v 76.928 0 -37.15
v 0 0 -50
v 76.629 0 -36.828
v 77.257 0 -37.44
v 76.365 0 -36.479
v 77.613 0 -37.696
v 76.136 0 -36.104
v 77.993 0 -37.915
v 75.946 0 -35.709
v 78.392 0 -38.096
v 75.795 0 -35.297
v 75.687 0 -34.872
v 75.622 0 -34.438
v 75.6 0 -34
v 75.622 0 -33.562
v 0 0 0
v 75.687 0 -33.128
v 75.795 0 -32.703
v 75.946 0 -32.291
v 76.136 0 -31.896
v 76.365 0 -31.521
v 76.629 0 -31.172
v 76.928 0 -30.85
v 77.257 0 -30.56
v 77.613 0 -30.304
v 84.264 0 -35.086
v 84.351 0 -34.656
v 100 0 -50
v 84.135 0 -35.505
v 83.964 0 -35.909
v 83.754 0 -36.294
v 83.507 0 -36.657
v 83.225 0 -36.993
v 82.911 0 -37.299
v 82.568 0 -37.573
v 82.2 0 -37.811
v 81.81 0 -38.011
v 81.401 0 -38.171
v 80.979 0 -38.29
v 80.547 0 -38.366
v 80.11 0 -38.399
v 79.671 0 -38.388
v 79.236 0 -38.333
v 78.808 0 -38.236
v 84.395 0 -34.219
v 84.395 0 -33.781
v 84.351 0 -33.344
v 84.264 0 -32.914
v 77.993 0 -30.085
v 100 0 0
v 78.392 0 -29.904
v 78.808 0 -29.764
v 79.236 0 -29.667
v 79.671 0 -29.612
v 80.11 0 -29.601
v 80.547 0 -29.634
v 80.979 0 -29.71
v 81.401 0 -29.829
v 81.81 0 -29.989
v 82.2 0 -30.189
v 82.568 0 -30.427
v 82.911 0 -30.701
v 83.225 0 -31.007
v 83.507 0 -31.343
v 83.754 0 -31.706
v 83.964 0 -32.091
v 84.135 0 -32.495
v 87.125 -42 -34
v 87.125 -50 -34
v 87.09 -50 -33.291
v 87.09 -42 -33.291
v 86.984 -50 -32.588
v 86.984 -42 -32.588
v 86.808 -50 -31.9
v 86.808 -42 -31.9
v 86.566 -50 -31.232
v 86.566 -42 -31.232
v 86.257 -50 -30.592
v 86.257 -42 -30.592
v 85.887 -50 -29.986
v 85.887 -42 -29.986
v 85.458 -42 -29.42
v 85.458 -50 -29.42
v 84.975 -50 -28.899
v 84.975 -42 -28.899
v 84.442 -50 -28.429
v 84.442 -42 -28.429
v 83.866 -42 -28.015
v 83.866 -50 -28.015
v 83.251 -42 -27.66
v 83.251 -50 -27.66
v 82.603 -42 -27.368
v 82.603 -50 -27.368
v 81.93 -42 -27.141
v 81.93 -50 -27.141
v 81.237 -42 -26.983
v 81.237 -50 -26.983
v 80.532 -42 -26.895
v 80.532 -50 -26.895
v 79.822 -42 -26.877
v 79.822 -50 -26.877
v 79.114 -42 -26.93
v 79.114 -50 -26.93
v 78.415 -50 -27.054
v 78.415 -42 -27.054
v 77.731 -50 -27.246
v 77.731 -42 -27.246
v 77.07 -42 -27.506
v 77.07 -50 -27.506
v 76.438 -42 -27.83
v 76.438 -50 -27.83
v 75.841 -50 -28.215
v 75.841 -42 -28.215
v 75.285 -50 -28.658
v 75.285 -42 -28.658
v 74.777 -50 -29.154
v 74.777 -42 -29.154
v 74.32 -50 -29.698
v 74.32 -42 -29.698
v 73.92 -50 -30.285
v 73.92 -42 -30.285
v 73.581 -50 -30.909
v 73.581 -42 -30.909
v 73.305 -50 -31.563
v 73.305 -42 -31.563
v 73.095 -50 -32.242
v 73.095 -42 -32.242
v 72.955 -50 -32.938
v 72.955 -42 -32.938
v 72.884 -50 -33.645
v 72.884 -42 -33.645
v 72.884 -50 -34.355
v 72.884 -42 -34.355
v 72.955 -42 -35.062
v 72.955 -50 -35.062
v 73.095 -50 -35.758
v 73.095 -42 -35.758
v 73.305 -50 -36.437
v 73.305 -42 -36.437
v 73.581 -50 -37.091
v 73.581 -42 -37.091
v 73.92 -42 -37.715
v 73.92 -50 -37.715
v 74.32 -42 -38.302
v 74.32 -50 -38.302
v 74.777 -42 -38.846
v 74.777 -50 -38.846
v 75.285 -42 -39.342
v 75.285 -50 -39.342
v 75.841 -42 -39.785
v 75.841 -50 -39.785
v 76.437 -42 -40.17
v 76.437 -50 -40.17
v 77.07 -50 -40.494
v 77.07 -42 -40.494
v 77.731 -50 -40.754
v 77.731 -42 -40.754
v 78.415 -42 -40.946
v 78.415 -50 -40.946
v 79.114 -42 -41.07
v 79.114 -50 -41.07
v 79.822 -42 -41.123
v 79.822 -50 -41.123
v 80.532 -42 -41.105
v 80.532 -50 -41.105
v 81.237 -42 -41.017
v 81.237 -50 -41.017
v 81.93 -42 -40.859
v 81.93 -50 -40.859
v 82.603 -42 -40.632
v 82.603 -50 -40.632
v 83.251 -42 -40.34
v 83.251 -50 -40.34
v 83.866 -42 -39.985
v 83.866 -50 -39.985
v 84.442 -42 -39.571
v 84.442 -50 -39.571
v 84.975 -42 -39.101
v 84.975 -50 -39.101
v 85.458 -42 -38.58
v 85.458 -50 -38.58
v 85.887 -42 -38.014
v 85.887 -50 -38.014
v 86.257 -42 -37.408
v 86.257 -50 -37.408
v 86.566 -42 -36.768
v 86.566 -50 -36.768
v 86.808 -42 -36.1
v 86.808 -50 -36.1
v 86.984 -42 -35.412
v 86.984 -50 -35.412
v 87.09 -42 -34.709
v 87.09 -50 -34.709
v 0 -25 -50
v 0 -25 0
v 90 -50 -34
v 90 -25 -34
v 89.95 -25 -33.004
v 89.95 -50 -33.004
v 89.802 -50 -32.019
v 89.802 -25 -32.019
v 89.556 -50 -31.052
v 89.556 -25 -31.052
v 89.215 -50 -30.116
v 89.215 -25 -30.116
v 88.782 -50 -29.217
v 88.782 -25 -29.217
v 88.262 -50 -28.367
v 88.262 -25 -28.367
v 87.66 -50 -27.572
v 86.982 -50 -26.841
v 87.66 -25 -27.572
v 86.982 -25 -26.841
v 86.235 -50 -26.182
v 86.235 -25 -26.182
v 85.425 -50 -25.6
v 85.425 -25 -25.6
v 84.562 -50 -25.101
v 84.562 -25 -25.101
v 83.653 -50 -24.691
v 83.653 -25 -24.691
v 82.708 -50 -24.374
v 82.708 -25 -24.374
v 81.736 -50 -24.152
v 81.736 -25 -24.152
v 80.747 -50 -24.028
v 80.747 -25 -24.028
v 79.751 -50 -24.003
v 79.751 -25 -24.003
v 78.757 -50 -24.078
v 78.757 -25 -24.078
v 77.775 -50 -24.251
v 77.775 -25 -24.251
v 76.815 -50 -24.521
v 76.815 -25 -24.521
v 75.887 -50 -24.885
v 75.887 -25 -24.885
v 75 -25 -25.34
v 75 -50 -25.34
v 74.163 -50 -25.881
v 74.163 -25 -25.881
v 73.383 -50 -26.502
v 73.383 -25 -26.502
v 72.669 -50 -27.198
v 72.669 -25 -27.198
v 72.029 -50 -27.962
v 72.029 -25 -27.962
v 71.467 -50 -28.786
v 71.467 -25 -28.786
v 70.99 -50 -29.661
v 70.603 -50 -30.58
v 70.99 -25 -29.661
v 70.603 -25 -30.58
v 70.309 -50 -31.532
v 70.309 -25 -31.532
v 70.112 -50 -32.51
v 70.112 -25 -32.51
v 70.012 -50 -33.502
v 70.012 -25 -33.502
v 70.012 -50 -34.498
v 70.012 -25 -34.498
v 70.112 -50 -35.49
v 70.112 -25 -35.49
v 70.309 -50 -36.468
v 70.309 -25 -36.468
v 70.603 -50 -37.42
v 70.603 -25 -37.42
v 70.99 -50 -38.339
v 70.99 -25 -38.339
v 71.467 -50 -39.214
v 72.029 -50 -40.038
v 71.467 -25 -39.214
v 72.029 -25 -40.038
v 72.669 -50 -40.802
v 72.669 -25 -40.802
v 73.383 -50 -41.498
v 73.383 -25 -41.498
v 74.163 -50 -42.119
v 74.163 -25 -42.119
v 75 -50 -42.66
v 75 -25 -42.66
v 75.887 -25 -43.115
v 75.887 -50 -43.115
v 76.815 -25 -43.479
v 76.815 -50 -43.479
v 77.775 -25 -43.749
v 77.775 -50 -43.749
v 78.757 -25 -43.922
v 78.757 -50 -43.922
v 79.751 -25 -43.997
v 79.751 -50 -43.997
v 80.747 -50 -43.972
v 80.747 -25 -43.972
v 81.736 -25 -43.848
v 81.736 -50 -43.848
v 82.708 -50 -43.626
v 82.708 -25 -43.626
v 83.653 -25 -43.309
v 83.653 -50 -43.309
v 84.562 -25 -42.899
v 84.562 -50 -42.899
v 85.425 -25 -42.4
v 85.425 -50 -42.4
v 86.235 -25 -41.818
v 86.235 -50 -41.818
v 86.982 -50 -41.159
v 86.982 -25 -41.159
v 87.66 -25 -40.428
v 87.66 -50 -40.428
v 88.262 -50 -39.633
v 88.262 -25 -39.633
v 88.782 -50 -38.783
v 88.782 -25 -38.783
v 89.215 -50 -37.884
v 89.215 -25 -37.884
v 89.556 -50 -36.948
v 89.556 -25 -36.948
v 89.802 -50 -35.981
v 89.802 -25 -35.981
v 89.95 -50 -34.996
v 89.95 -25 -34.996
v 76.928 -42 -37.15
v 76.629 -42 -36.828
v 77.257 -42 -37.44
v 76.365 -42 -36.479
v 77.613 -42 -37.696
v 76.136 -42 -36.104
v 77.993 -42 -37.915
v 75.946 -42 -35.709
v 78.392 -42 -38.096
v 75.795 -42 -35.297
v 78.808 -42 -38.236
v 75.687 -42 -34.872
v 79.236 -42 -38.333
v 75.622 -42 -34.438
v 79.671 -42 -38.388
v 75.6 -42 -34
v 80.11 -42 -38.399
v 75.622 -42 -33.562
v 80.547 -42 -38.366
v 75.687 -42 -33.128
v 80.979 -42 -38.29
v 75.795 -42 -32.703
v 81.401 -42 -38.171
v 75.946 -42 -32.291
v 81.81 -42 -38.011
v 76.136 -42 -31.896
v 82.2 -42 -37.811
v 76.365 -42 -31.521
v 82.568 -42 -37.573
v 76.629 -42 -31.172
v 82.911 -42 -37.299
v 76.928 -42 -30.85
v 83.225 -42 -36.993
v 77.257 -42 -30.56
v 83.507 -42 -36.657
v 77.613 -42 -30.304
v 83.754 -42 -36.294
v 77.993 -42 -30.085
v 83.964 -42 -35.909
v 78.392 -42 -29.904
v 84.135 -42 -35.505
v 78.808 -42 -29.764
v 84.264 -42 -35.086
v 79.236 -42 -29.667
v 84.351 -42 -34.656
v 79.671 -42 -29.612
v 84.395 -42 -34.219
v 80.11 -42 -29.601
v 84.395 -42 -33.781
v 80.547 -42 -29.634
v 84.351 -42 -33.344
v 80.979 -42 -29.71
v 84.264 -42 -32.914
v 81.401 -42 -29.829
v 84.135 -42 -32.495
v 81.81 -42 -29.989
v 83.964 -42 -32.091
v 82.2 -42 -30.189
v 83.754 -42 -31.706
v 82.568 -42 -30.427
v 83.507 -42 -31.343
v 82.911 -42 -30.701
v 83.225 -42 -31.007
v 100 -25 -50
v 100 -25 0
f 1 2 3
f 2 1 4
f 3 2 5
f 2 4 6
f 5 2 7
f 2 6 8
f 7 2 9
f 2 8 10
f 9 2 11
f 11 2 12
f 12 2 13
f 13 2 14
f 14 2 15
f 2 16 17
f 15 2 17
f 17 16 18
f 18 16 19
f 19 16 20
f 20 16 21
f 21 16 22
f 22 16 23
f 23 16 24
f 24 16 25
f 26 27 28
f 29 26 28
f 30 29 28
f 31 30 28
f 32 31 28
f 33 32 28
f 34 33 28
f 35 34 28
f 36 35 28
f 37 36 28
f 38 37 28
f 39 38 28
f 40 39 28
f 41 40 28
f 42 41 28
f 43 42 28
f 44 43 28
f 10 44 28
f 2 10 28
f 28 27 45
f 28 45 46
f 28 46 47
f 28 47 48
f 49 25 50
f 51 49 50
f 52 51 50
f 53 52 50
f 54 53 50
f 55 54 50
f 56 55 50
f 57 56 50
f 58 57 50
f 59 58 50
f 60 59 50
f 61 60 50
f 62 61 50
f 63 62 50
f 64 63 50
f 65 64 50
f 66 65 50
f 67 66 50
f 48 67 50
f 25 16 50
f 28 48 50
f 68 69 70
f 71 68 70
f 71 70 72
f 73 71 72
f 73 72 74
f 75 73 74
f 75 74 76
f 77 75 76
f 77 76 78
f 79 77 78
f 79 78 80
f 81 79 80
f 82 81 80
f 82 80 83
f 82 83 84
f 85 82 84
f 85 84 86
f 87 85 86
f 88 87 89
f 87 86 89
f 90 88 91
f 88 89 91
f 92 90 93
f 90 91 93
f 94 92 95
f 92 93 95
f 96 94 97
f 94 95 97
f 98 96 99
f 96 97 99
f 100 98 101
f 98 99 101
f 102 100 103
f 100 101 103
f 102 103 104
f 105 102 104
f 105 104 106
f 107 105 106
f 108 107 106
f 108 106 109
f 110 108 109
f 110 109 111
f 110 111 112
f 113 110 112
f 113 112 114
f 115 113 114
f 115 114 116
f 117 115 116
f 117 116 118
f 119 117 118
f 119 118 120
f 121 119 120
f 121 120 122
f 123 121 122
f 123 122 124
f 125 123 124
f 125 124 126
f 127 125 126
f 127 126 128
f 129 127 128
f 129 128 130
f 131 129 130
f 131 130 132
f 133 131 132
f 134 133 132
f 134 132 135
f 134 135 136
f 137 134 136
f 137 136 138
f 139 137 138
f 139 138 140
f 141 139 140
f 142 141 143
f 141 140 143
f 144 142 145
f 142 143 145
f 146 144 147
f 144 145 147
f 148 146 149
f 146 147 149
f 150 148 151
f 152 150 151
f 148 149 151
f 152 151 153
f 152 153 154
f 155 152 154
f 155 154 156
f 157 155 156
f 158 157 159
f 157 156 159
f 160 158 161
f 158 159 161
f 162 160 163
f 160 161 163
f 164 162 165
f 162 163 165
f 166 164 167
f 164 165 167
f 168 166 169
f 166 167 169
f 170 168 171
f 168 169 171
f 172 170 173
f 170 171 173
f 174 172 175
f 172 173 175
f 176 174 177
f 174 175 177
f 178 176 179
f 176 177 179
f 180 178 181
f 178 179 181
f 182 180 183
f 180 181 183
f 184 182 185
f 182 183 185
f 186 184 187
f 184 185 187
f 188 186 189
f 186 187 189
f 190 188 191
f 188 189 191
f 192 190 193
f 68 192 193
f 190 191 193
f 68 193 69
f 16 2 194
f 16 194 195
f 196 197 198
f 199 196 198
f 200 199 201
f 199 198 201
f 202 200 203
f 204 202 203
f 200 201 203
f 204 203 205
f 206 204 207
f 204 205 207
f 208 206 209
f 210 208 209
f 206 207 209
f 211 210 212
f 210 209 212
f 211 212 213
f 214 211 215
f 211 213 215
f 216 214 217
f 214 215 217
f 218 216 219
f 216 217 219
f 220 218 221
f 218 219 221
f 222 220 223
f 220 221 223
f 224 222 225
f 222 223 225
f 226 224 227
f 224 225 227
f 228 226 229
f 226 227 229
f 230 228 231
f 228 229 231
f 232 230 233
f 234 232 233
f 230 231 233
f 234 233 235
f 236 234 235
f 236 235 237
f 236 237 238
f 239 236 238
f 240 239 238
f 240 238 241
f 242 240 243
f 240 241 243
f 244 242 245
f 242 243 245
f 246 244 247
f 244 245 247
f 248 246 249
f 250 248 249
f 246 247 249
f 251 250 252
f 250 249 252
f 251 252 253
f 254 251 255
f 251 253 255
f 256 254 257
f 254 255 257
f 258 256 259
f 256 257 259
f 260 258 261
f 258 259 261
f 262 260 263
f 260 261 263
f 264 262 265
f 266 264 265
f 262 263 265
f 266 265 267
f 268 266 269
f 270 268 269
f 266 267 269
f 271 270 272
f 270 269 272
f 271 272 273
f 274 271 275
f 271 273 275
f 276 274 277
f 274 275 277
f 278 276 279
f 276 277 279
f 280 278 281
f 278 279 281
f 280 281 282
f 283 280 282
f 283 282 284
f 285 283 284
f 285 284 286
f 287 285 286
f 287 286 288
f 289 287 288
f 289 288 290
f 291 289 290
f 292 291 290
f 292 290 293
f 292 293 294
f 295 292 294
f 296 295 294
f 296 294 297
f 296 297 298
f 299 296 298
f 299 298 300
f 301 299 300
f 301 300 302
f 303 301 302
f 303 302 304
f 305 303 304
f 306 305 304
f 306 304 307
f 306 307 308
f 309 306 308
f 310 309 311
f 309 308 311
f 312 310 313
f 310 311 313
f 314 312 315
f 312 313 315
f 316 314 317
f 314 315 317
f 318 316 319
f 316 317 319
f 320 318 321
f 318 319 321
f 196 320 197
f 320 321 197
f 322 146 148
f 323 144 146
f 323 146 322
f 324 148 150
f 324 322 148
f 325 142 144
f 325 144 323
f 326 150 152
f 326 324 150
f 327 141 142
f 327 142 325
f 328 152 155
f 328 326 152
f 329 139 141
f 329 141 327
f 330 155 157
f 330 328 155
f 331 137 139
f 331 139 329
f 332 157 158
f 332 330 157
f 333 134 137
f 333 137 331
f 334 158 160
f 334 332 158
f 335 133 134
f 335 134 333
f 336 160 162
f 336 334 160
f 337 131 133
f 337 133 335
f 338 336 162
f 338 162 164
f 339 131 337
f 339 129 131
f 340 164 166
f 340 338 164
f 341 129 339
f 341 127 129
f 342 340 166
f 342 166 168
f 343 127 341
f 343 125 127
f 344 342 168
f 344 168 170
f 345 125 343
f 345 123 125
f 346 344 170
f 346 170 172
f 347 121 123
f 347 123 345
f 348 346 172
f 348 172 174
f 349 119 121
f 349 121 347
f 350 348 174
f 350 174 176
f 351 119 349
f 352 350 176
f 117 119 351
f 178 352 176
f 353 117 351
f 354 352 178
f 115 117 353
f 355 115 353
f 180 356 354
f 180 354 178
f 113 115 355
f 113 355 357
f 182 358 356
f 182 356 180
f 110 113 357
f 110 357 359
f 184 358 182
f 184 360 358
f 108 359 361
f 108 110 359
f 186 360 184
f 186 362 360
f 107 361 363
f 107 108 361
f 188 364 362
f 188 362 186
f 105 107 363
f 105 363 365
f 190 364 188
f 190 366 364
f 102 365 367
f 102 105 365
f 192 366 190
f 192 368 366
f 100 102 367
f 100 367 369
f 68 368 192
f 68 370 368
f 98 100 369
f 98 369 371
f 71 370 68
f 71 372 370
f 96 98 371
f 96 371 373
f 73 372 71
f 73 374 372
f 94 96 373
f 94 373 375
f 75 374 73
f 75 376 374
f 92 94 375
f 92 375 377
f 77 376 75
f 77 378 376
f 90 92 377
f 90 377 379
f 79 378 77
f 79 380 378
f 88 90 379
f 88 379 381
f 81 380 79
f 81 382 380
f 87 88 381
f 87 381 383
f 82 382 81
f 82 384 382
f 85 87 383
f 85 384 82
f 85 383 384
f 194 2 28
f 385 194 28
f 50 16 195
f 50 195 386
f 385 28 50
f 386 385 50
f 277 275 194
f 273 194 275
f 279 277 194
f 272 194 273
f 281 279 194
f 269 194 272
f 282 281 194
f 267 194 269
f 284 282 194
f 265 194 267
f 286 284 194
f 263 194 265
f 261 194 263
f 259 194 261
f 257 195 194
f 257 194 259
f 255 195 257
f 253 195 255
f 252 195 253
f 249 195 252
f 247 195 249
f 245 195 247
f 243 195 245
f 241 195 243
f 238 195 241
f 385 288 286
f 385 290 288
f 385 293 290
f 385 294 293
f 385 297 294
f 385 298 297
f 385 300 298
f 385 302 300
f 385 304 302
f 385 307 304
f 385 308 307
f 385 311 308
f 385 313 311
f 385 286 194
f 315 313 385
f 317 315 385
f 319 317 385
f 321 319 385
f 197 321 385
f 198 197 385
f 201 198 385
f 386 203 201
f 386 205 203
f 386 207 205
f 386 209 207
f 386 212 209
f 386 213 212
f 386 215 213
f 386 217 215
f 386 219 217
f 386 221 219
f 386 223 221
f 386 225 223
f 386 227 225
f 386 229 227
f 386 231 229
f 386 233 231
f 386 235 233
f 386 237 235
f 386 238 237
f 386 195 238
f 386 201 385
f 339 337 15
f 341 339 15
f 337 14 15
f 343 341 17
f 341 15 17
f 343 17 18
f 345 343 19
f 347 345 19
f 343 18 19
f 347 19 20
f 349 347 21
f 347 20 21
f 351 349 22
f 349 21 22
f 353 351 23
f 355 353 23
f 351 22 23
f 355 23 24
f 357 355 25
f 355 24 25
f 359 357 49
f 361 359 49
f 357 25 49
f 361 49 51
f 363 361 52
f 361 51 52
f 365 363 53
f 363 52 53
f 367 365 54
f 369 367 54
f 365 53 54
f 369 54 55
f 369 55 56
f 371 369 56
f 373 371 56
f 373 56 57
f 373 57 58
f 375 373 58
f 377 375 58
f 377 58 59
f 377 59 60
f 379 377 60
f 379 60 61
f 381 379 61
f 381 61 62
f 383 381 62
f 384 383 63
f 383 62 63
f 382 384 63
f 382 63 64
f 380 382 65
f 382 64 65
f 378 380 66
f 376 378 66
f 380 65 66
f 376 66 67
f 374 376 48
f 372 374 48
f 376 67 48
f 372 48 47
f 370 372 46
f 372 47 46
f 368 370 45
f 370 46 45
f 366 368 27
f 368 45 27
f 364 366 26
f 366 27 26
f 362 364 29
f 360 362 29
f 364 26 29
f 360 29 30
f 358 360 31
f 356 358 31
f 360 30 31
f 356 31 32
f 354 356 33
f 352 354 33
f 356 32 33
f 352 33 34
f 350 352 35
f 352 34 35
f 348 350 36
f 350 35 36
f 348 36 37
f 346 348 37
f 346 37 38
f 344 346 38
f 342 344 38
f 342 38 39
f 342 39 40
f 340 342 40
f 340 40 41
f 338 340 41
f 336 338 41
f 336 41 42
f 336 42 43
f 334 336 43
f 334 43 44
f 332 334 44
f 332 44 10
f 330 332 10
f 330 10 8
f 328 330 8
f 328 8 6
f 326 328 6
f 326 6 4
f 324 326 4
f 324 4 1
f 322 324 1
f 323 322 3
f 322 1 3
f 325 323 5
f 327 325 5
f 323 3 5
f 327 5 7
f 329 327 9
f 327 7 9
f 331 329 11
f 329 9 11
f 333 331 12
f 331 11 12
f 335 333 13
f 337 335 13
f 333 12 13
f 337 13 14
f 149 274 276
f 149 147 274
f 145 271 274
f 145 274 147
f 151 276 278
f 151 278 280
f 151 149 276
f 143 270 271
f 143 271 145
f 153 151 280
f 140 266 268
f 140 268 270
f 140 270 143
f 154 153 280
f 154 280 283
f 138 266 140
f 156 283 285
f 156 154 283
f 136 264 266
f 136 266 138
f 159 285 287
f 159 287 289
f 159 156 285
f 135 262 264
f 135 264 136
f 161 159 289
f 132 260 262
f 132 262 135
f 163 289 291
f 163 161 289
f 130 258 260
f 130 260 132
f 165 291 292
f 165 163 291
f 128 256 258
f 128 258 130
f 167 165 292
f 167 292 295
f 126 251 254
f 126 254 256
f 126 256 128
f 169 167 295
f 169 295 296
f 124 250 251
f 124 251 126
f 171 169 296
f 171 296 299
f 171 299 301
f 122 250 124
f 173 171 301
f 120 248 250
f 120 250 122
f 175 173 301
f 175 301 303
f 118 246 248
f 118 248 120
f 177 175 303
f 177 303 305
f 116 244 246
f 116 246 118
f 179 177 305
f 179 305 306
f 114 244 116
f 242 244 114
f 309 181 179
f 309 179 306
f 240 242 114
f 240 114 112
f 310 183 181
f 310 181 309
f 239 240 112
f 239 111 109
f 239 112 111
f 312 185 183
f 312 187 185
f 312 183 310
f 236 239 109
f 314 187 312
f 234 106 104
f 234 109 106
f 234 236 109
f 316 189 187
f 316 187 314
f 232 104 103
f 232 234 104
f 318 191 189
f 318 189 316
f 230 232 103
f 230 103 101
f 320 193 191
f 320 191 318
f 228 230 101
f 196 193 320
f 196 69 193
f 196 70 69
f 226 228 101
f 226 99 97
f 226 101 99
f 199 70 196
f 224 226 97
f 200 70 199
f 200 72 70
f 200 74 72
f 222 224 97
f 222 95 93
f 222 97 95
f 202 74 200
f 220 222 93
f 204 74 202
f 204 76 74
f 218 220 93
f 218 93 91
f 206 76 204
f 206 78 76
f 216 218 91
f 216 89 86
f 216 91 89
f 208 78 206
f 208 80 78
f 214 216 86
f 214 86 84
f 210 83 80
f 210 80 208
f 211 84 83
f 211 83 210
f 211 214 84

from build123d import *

# Parameters (mm, degrees)
F0_W           = 100
F0_H           = 50
F1_DEPTH       = 25
F2_R           = 10
F3_DEPTH       = 25
F5_D           = 8.8
F5_CBORE_D     = 14.25
F5_CBORE_DEPTH = 8


with BuildPart() as f1:
    # F0 (on Front) → F1 (new body)
    with BuildSketch(Plane.XZ):
        with Locations((50, -25)):
            Rectangle(F0_W, F0_H)
    extrude(amount=F1_DEPTH)

    # F2 (on face) → F3 (join)
    with BuildSketch(Plane.XZ.offset(25)):
        with Locations((80, -34)):
            Circle(F2_R)
    extrude(amount=F3_DEPTH)

    # F5 (through all)
    with Locations(Plane.XZ.offset(50)):
        with Locations((80, -34)):
            CounterBoreHole(F5_D / 2, F5_CBORE_D / 2, F5_CBORE_DEPTH)


solid = f1.part
